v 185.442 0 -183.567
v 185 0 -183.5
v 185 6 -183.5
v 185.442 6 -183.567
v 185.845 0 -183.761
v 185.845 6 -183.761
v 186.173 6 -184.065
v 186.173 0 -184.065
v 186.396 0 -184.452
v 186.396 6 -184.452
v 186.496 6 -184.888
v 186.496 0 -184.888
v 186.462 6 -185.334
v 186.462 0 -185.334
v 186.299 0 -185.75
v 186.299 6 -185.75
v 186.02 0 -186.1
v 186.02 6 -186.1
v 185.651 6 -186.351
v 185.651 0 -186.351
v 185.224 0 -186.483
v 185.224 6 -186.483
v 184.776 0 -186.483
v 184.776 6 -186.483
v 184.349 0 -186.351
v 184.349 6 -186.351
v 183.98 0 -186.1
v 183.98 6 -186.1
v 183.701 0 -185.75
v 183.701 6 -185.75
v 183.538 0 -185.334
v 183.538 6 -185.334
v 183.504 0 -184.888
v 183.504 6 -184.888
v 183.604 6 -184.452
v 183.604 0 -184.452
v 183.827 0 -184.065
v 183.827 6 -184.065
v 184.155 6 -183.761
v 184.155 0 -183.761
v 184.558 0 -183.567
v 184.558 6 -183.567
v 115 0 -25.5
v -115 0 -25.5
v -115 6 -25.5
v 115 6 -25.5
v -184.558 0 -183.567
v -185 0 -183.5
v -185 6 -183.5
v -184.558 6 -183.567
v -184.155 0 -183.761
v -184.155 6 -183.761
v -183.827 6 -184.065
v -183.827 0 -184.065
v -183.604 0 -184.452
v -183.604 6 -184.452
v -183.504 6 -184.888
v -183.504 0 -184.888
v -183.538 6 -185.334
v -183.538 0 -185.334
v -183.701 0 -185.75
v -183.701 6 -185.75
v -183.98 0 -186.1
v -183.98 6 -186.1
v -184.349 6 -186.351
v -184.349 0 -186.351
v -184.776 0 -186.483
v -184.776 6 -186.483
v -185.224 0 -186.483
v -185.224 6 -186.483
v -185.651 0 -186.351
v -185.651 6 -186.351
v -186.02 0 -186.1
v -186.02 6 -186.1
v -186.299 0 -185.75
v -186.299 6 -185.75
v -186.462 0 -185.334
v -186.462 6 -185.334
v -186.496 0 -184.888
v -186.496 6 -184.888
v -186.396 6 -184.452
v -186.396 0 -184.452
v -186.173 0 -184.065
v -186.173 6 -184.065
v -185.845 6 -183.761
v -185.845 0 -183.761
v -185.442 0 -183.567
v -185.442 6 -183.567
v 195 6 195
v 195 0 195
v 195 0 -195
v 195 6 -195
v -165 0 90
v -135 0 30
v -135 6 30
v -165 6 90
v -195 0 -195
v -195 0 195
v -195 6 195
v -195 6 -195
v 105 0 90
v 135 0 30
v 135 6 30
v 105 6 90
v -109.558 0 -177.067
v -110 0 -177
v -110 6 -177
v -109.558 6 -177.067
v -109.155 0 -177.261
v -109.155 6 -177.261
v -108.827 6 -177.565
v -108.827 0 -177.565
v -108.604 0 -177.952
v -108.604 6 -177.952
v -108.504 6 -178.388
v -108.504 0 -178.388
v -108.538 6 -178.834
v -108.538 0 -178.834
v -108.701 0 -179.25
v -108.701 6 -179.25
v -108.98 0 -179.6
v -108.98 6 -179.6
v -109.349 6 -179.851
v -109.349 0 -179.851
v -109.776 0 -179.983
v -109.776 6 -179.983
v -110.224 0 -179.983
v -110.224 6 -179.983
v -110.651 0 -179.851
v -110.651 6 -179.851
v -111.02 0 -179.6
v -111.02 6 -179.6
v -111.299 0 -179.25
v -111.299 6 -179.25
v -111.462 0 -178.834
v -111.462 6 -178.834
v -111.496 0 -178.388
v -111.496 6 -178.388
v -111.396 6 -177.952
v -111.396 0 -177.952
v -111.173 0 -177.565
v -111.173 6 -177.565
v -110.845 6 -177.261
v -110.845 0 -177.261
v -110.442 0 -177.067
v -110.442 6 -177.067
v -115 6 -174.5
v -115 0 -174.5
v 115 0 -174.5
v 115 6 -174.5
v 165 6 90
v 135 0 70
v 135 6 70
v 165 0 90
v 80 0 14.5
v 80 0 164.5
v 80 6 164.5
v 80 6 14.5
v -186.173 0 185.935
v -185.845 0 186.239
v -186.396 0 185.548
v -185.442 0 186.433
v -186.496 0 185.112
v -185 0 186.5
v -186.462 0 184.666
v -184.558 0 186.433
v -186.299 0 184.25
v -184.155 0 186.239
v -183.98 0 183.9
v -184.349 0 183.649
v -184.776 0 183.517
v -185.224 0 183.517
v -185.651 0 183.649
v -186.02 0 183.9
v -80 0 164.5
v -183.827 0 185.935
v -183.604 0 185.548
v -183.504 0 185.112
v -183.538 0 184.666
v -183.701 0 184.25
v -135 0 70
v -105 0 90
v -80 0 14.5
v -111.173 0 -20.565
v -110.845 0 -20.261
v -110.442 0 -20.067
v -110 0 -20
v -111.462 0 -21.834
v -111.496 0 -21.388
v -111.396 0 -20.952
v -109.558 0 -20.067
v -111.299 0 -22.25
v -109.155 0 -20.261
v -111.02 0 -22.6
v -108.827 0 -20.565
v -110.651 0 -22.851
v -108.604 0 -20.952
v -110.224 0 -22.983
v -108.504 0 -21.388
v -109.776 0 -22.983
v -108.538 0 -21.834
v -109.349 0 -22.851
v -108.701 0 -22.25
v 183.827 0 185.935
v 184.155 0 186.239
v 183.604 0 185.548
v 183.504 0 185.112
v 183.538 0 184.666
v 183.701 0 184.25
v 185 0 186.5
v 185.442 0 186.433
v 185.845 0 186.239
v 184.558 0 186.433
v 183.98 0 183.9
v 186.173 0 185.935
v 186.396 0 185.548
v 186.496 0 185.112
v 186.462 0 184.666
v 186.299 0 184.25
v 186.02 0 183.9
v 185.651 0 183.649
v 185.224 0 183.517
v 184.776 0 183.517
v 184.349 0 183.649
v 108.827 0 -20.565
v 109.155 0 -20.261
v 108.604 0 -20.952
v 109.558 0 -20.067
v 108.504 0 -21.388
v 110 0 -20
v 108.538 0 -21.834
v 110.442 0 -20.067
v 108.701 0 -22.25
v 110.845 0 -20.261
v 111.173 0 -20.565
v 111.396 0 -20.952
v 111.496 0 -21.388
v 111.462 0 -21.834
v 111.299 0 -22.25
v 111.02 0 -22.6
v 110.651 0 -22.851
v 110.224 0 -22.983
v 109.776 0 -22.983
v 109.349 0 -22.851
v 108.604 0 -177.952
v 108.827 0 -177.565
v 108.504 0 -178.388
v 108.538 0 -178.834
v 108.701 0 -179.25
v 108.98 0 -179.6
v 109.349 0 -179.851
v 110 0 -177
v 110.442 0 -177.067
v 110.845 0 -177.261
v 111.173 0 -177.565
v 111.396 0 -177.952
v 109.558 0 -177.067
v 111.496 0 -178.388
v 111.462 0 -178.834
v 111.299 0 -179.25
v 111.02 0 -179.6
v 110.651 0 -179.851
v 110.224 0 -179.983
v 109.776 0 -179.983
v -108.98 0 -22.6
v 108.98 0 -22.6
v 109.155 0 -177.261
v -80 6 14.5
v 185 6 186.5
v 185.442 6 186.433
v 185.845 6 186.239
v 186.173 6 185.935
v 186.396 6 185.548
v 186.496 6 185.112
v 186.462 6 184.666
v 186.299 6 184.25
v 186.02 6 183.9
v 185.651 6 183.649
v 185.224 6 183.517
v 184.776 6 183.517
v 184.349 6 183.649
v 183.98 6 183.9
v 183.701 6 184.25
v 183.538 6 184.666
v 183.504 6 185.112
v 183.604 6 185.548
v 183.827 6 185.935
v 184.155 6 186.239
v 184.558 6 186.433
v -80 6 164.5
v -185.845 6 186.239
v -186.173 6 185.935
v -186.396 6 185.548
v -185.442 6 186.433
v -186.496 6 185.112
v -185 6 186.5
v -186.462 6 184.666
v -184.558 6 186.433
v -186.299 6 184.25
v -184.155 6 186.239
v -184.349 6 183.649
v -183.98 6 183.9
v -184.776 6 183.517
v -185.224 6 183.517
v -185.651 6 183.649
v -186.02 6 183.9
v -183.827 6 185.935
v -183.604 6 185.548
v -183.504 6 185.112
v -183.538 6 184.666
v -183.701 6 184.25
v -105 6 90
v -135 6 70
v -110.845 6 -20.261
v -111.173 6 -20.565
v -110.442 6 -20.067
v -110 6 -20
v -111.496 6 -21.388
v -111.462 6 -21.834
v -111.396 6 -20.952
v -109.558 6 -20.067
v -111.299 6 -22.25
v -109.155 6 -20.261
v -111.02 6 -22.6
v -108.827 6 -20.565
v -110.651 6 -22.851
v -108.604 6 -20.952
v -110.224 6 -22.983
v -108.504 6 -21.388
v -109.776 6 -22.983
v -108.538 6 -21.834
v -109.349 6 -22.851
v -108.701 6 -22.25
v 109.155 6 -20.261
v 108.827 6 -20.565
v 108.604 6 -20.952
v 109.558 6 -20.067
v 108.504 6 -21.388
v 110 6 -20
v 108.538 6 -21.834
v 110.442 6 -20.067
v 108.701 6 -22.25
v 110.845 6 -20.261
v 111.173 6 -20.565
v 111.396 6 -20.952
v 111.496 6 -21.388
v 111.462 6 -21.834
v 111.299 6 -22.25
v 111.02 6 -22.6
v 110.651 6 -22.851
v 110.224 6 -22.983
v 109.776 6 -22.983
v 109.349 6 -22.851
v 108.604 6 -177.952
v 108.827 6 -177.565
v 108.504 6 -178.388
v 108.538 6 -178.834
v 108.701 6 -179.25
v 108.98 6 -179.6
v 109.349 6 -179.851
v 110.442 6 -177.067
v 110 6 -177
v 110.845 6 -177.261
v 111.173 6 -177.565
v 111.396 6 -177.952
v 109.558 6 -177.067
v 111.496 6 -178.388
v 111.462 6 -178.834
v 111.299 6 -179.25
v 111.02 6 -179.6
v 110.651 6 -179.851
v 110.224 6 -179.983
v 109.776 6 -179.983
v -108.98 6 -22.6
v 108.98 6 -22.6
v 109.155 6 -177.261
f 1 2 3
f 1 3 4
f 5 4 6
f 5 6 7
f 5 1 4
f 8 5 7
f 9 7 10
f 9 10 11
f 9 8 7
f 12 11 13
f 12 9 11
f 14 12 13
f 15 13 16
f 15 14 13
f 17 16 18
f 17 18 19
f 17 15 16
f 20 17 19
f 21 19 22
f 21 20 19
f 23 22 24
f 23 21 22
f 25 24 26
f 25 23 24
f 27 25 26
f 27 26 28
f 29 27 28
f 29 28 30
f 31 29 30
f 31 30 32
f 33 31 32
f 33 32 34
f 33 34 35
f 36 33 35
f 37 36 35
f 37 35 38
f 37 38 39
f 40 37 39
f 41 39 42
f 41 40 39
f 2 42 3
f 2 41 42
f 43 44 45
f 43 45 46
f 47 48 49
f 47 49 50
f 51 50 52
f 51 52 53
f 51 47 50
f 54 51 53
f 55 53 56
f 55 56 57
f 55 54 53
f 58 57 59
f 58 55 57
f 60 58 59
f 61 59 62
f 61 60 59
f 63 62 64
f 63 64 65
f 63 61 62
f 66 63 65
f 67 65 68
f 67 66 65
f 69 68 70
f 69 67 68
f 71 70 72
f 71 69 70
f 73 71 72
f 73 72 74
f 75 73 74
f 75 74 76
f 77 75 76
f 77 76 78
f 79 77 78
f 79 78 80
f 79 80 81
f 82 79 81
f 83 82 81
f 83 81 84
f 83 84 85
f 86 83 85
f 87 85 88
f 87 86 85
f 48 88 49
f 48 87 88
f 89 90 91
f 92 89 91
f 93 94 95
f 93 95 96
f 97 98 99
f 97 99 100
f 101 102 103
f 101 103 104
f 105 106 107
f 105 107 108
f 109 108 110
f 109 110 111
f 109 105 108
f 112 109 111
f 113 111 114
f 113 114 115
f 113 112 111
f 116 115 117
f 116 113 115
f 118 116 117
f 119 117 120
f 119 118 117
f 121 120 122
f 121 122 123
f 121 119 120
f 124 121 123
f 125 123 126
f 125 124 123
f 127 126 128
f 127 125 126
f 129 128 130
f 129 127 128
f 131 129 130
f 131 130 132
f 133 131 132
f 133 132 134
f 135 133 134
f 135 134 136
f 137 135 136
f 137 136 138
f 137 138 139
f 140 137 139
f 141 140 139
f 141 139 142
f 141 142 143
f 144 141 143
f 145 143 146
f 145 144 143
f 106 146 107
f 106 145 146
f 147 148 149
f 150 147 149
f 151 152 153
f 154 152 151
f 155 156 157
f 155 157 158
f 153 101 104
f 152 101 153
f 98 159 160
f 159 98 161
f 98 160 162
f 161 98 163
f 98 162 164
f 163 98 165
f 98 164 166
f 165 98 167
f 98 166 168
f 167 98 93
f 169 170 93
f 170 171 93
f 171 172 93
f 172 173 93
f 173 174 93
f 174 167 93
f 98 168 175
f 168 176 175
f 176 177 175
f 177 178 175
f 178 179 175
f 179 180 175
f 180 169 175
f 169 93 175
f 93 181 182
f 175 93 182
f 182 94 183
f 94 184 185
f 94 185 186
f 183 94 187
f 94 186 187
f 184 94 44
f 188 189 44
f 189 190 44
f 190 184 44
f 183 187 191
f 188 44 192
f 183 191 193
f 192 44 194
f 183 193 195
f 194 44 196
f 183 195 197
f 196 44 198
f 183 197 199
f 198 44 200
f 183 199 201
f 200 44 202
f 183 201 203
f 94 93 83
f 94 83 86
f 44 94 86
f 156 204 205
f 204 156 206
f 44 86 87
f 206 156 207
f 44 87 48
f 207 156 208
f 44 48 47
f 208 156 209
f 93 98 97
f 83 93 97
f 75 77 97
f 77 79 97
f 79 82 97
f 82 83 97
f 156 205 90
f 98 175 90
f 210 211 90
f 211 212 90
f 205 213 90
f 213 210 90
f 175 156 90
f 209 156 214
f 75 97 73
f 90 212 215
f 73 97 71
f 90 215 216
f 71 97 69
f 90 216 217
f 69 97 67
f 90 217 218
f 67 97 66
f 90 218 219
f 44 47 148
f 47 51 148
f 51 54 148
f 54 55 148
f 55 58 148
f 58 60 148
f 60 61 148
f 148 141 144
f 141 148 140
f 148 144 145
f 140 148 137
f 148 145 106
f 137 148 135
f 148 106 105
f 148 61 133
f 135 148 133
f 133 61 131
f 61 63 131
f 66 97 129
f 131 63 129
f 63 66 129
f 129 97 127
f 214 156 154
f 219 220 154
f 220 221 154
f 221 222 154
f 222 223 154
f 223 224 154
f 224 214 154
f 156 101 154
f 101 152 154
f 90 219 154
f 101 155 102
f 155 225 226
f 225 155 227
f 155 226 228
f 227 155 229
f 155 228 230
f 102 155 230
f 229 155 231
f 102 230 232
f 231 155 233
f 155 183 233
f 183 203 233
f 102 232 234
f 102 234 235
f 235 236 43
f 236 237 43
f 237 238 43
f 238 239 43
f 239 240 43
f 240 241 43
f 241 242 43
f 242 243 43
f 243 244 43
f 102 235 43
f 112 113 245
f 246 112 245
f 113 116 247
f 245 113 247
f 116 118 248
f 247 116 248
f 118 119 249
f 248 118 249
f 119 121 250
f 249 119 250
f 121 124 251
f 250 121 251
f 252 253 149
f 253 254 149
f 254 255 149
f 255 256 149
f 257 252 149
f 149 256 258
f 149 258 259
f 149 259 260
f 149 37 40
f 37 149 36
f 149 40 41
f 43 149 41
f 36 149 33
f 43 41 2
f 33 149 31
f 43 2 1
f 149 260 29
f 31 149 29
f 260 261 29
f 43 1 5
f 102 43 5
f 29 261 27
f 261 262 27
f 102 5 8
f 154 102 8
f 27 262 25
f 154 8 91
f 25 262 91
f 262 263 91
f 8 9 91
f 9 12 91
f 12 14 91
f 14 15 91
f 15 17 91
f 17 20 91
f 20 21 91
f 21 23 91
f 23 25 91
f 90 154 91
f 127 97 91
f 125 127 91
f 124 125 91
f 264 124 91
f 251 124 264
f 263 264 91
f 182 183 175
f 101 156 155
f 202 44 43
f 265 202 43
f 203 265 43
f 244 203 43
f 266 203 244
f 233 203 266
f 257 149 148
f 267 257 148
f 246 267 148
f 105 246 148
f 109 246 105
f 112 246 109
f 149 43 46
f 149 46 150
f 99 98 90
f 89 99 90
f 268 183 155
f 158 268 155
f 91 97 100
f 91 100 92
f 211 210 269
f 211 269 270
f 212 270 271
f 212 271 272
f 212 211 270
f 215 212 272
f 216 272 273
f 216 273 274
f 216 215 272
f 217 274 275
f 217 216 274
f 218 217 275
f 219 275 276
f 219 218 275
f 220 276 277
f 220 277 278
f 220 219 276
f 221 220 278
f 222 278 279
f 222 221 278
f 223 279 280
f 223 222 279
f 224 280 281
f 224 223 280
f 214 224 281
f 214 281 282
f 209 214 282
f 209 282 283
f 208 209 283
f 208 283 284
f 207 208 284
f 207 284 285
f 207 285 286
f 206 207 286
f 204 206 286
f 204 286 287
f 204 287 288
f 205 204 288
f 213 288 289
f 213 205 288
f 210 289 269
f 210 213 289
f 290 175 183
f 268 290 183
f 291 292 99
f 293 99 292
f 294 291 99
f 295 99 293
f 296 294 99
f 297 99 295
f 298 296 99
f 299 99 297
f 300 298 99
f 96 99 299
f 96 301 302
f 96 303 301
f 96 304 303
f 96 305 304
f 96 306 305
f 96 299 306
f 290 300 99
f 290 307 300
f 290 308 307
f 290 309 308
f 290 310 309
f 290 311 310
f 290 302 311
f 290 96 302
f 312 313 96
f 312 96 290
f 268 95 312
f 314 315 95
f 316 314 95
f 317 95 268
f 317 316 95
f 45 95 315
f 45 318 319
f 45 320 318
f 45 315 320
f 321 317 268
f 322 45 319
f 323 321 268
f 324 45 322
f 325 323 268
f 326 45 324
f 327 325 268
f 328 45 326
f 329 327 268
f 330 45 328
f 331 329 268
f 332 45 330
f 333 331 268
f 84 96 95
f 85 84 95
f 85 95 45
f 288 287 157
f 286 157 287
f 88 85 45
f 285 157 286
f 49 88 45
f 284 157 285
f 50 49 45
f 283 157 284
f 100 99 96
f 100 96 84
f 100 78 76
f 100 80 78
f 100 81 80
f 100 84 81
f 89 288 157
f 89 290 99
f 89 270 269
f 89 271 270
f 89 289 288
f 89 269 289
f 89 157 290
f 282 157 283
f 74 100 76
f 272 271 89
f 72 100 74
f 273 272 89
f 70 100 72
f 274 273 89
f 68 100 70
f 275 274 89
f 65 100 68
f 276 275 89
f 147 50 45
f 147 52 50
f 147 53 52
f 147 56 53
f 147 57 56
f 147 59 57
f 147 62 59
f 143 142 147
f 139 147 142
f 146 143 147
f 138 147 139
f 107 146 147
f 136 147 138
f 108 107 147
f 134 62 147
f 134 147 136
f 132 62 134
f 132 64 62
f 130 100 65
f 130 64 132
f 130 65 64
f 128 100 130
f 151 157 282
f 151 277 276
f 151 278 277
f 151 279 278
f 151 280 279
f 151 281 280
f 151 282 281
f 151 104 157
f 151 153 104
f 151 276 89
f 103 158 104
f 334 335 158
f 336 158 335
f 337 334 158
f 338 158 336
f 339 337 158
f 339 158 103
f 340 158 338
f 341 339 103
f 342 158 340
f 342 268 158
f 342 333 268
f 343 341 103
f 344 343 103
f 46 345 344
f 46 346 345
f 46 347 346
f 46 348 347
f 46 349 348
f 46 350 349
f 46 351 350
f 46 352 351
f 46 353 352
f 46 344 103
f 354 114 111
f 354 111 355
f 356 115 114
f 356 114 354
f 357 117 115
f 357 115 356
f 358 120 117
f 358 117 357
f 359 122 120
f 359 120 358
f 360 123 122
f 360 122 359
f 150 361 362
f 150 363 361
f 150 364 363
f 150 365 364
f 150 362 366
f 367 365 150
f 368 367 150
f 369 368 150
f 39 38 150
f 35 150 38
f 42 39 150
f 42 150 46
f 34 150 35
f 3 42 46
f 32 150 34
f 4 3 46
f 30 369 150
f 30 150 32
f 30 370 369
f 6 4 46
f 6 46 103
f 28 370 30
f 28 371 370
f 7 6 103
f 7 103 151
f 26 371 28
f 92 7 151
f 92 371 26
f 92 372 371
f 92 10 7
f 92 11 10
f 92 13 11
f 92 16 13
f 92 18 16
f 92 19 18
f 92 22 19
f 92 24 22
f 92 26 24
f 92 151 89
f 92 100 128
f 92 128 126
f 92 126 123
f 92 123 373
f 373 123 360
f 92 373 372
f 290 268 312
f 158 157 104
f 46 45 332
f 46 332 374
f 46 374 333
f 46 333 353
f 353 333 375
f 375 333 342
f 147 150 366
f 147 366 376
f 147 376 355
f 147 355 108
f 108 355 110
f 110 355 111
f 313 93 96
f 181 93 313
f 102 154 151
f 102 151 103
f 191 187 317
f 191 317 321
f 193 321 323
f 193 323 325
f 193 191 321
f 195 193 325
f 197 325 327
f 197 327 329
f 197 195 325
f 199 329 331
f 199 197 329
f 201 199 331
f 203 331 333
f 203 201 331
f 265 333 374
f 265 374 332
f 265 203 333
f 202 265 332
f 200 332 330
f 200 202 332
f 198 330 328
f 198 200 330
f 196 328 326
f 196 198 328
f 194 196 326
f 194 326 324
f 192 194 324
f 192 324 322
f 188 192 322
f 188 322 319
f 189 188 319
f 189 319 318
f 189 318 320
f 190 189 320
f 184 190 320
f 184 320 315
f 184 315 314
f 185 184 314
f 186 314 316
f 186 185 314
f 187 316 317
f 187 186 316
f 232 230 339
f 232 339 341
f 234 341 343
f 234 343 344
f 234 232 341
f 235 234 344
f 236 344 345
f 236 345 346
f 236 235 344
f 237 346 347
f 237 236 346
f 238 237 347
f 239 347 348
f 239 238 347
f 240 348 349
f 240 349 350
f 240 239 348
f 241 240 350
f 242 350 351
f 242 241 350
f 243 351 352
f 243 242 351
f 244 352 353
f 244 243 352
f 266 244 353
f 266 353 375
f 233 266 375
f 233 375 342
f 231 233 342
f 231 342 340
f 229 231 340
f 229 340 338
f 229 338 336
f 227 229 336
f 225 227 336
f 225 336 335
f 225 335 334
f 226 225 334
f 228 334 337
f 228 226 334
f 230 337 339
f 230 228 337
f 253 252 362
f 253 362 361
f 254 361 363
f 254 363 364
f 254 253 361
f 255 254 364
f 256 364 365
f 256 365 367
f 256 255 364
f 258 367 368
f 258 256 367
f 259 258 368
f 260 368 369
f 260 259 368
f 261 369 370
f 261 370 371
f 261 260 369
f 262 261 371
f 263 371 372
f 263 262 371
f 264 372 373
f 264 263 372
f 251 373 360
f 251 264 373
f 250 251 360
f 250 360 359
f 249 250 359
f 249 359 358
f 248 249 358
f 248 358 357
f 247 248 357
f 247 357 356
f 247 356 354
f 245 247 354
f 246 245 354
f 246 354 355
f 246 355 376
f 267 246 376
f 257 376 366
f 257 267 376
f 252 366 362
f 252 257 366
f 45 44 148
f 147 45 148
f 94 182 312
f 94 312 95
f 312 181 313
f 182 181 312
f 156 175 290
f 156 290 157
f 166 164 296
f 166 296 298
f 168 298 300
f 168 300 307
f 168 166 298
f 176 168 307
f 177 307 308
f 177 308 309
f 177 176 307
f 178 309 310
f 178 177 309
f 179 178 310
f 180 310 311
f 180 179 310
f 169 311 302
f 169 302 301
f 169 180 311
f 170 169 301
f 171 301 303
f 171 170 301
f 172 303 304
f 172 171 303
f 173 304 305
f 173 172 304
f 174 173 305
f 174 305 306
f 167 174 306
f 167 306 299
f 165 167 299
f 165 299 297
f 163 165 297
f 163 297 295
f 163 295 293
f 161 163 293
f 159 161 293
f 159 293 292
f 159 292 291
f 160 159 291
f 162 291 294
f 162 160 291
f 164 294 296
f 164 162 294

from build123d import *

# Parameters (mm, degrees)
SKETCH_2_W      = 390
SKETCH_2_H      = 390
SKETCH_2_R      = 1.5
SKETCH_2_W_2    = 230
SKETCH_2_H_2    = 149
SKETCH_2_W_3    = 160
SKETCH_2_H_3    = 150
EXTRUDE_1_DEPTH = 6


with BuildPart() as part:
    # 草图2 → 凸台-拉伸1 (new body)
    with BuildSketch(Plane(origin=(0, 0, 0), x_dir=(1, 0, 0), z_dir=(0, 1, 0))):
        Rectangle(SKETCH_2_W, SKETCH_2_H)
        with Locations(Location((185, -185, 0), (0, 0, 270))):
            Circle(SKETCH_2_R, mode=Mode.SUBTRACT)
        with Locations(Location((-185, 185, 0), (0, 0, 270))):
            Circle(SKETCH_2_R, mode=Mode.SUBTRACT)
        with Locations(Location((110, 21.5, 0), (0, 0, 270))):
            Circle(SKETCH_2_R, mode=Mode.SUBTRACT)
        with Locations(Location((-110, 178.5, 0), (0, 0, 270))):
            Circle(SKETCH_2_R, mode=Mode.SUBTRACT)
        with Locations(Location((-110, 21.5, 0), (0, 0, 270))):
            Circle(SKETCH_2_R, mode=Mode.SUBTRACT)
        with Locations(Location((110, 178.5, 0), (0, 0, 270))):
            Circle(SKETCH_2_R, mode=Mode.SUBTRACT)
        with Locations(Location((-185, -185, 0), (0, 0, 270))):
            Circle(SKETCH_2_R, mode=Mode.SUBTRACT)
        with Locations(Location((185, 185, 0), (0, 0, 270))):
            Circle(SKETCH_2_R, mode=Mode.SUBTRACT)
        with Locations((0, 100)):
            Rectangle(SKETCH_2_W_2, SKETCH_2_H_2, mode=Mode.SUBTRACT)
        with Locations((0, -89.5)):
            Rectangle(SKETCH_2_W_3, SKETCH_2_H_3, mode=Mode.SUBTRACT)
        Polygon((-135, -70), (-105, -90), (-135, -30), (-165, -90), align=None, mode=Mode.SUBTRACT)
        Polygon((135, -70), (165, -90), (135, -30), (105, -90), align=None, mode=Mode.SUBTRACT)
    extrude(amount=EXTRUDE_1_DEPTH)


solid = part.part
